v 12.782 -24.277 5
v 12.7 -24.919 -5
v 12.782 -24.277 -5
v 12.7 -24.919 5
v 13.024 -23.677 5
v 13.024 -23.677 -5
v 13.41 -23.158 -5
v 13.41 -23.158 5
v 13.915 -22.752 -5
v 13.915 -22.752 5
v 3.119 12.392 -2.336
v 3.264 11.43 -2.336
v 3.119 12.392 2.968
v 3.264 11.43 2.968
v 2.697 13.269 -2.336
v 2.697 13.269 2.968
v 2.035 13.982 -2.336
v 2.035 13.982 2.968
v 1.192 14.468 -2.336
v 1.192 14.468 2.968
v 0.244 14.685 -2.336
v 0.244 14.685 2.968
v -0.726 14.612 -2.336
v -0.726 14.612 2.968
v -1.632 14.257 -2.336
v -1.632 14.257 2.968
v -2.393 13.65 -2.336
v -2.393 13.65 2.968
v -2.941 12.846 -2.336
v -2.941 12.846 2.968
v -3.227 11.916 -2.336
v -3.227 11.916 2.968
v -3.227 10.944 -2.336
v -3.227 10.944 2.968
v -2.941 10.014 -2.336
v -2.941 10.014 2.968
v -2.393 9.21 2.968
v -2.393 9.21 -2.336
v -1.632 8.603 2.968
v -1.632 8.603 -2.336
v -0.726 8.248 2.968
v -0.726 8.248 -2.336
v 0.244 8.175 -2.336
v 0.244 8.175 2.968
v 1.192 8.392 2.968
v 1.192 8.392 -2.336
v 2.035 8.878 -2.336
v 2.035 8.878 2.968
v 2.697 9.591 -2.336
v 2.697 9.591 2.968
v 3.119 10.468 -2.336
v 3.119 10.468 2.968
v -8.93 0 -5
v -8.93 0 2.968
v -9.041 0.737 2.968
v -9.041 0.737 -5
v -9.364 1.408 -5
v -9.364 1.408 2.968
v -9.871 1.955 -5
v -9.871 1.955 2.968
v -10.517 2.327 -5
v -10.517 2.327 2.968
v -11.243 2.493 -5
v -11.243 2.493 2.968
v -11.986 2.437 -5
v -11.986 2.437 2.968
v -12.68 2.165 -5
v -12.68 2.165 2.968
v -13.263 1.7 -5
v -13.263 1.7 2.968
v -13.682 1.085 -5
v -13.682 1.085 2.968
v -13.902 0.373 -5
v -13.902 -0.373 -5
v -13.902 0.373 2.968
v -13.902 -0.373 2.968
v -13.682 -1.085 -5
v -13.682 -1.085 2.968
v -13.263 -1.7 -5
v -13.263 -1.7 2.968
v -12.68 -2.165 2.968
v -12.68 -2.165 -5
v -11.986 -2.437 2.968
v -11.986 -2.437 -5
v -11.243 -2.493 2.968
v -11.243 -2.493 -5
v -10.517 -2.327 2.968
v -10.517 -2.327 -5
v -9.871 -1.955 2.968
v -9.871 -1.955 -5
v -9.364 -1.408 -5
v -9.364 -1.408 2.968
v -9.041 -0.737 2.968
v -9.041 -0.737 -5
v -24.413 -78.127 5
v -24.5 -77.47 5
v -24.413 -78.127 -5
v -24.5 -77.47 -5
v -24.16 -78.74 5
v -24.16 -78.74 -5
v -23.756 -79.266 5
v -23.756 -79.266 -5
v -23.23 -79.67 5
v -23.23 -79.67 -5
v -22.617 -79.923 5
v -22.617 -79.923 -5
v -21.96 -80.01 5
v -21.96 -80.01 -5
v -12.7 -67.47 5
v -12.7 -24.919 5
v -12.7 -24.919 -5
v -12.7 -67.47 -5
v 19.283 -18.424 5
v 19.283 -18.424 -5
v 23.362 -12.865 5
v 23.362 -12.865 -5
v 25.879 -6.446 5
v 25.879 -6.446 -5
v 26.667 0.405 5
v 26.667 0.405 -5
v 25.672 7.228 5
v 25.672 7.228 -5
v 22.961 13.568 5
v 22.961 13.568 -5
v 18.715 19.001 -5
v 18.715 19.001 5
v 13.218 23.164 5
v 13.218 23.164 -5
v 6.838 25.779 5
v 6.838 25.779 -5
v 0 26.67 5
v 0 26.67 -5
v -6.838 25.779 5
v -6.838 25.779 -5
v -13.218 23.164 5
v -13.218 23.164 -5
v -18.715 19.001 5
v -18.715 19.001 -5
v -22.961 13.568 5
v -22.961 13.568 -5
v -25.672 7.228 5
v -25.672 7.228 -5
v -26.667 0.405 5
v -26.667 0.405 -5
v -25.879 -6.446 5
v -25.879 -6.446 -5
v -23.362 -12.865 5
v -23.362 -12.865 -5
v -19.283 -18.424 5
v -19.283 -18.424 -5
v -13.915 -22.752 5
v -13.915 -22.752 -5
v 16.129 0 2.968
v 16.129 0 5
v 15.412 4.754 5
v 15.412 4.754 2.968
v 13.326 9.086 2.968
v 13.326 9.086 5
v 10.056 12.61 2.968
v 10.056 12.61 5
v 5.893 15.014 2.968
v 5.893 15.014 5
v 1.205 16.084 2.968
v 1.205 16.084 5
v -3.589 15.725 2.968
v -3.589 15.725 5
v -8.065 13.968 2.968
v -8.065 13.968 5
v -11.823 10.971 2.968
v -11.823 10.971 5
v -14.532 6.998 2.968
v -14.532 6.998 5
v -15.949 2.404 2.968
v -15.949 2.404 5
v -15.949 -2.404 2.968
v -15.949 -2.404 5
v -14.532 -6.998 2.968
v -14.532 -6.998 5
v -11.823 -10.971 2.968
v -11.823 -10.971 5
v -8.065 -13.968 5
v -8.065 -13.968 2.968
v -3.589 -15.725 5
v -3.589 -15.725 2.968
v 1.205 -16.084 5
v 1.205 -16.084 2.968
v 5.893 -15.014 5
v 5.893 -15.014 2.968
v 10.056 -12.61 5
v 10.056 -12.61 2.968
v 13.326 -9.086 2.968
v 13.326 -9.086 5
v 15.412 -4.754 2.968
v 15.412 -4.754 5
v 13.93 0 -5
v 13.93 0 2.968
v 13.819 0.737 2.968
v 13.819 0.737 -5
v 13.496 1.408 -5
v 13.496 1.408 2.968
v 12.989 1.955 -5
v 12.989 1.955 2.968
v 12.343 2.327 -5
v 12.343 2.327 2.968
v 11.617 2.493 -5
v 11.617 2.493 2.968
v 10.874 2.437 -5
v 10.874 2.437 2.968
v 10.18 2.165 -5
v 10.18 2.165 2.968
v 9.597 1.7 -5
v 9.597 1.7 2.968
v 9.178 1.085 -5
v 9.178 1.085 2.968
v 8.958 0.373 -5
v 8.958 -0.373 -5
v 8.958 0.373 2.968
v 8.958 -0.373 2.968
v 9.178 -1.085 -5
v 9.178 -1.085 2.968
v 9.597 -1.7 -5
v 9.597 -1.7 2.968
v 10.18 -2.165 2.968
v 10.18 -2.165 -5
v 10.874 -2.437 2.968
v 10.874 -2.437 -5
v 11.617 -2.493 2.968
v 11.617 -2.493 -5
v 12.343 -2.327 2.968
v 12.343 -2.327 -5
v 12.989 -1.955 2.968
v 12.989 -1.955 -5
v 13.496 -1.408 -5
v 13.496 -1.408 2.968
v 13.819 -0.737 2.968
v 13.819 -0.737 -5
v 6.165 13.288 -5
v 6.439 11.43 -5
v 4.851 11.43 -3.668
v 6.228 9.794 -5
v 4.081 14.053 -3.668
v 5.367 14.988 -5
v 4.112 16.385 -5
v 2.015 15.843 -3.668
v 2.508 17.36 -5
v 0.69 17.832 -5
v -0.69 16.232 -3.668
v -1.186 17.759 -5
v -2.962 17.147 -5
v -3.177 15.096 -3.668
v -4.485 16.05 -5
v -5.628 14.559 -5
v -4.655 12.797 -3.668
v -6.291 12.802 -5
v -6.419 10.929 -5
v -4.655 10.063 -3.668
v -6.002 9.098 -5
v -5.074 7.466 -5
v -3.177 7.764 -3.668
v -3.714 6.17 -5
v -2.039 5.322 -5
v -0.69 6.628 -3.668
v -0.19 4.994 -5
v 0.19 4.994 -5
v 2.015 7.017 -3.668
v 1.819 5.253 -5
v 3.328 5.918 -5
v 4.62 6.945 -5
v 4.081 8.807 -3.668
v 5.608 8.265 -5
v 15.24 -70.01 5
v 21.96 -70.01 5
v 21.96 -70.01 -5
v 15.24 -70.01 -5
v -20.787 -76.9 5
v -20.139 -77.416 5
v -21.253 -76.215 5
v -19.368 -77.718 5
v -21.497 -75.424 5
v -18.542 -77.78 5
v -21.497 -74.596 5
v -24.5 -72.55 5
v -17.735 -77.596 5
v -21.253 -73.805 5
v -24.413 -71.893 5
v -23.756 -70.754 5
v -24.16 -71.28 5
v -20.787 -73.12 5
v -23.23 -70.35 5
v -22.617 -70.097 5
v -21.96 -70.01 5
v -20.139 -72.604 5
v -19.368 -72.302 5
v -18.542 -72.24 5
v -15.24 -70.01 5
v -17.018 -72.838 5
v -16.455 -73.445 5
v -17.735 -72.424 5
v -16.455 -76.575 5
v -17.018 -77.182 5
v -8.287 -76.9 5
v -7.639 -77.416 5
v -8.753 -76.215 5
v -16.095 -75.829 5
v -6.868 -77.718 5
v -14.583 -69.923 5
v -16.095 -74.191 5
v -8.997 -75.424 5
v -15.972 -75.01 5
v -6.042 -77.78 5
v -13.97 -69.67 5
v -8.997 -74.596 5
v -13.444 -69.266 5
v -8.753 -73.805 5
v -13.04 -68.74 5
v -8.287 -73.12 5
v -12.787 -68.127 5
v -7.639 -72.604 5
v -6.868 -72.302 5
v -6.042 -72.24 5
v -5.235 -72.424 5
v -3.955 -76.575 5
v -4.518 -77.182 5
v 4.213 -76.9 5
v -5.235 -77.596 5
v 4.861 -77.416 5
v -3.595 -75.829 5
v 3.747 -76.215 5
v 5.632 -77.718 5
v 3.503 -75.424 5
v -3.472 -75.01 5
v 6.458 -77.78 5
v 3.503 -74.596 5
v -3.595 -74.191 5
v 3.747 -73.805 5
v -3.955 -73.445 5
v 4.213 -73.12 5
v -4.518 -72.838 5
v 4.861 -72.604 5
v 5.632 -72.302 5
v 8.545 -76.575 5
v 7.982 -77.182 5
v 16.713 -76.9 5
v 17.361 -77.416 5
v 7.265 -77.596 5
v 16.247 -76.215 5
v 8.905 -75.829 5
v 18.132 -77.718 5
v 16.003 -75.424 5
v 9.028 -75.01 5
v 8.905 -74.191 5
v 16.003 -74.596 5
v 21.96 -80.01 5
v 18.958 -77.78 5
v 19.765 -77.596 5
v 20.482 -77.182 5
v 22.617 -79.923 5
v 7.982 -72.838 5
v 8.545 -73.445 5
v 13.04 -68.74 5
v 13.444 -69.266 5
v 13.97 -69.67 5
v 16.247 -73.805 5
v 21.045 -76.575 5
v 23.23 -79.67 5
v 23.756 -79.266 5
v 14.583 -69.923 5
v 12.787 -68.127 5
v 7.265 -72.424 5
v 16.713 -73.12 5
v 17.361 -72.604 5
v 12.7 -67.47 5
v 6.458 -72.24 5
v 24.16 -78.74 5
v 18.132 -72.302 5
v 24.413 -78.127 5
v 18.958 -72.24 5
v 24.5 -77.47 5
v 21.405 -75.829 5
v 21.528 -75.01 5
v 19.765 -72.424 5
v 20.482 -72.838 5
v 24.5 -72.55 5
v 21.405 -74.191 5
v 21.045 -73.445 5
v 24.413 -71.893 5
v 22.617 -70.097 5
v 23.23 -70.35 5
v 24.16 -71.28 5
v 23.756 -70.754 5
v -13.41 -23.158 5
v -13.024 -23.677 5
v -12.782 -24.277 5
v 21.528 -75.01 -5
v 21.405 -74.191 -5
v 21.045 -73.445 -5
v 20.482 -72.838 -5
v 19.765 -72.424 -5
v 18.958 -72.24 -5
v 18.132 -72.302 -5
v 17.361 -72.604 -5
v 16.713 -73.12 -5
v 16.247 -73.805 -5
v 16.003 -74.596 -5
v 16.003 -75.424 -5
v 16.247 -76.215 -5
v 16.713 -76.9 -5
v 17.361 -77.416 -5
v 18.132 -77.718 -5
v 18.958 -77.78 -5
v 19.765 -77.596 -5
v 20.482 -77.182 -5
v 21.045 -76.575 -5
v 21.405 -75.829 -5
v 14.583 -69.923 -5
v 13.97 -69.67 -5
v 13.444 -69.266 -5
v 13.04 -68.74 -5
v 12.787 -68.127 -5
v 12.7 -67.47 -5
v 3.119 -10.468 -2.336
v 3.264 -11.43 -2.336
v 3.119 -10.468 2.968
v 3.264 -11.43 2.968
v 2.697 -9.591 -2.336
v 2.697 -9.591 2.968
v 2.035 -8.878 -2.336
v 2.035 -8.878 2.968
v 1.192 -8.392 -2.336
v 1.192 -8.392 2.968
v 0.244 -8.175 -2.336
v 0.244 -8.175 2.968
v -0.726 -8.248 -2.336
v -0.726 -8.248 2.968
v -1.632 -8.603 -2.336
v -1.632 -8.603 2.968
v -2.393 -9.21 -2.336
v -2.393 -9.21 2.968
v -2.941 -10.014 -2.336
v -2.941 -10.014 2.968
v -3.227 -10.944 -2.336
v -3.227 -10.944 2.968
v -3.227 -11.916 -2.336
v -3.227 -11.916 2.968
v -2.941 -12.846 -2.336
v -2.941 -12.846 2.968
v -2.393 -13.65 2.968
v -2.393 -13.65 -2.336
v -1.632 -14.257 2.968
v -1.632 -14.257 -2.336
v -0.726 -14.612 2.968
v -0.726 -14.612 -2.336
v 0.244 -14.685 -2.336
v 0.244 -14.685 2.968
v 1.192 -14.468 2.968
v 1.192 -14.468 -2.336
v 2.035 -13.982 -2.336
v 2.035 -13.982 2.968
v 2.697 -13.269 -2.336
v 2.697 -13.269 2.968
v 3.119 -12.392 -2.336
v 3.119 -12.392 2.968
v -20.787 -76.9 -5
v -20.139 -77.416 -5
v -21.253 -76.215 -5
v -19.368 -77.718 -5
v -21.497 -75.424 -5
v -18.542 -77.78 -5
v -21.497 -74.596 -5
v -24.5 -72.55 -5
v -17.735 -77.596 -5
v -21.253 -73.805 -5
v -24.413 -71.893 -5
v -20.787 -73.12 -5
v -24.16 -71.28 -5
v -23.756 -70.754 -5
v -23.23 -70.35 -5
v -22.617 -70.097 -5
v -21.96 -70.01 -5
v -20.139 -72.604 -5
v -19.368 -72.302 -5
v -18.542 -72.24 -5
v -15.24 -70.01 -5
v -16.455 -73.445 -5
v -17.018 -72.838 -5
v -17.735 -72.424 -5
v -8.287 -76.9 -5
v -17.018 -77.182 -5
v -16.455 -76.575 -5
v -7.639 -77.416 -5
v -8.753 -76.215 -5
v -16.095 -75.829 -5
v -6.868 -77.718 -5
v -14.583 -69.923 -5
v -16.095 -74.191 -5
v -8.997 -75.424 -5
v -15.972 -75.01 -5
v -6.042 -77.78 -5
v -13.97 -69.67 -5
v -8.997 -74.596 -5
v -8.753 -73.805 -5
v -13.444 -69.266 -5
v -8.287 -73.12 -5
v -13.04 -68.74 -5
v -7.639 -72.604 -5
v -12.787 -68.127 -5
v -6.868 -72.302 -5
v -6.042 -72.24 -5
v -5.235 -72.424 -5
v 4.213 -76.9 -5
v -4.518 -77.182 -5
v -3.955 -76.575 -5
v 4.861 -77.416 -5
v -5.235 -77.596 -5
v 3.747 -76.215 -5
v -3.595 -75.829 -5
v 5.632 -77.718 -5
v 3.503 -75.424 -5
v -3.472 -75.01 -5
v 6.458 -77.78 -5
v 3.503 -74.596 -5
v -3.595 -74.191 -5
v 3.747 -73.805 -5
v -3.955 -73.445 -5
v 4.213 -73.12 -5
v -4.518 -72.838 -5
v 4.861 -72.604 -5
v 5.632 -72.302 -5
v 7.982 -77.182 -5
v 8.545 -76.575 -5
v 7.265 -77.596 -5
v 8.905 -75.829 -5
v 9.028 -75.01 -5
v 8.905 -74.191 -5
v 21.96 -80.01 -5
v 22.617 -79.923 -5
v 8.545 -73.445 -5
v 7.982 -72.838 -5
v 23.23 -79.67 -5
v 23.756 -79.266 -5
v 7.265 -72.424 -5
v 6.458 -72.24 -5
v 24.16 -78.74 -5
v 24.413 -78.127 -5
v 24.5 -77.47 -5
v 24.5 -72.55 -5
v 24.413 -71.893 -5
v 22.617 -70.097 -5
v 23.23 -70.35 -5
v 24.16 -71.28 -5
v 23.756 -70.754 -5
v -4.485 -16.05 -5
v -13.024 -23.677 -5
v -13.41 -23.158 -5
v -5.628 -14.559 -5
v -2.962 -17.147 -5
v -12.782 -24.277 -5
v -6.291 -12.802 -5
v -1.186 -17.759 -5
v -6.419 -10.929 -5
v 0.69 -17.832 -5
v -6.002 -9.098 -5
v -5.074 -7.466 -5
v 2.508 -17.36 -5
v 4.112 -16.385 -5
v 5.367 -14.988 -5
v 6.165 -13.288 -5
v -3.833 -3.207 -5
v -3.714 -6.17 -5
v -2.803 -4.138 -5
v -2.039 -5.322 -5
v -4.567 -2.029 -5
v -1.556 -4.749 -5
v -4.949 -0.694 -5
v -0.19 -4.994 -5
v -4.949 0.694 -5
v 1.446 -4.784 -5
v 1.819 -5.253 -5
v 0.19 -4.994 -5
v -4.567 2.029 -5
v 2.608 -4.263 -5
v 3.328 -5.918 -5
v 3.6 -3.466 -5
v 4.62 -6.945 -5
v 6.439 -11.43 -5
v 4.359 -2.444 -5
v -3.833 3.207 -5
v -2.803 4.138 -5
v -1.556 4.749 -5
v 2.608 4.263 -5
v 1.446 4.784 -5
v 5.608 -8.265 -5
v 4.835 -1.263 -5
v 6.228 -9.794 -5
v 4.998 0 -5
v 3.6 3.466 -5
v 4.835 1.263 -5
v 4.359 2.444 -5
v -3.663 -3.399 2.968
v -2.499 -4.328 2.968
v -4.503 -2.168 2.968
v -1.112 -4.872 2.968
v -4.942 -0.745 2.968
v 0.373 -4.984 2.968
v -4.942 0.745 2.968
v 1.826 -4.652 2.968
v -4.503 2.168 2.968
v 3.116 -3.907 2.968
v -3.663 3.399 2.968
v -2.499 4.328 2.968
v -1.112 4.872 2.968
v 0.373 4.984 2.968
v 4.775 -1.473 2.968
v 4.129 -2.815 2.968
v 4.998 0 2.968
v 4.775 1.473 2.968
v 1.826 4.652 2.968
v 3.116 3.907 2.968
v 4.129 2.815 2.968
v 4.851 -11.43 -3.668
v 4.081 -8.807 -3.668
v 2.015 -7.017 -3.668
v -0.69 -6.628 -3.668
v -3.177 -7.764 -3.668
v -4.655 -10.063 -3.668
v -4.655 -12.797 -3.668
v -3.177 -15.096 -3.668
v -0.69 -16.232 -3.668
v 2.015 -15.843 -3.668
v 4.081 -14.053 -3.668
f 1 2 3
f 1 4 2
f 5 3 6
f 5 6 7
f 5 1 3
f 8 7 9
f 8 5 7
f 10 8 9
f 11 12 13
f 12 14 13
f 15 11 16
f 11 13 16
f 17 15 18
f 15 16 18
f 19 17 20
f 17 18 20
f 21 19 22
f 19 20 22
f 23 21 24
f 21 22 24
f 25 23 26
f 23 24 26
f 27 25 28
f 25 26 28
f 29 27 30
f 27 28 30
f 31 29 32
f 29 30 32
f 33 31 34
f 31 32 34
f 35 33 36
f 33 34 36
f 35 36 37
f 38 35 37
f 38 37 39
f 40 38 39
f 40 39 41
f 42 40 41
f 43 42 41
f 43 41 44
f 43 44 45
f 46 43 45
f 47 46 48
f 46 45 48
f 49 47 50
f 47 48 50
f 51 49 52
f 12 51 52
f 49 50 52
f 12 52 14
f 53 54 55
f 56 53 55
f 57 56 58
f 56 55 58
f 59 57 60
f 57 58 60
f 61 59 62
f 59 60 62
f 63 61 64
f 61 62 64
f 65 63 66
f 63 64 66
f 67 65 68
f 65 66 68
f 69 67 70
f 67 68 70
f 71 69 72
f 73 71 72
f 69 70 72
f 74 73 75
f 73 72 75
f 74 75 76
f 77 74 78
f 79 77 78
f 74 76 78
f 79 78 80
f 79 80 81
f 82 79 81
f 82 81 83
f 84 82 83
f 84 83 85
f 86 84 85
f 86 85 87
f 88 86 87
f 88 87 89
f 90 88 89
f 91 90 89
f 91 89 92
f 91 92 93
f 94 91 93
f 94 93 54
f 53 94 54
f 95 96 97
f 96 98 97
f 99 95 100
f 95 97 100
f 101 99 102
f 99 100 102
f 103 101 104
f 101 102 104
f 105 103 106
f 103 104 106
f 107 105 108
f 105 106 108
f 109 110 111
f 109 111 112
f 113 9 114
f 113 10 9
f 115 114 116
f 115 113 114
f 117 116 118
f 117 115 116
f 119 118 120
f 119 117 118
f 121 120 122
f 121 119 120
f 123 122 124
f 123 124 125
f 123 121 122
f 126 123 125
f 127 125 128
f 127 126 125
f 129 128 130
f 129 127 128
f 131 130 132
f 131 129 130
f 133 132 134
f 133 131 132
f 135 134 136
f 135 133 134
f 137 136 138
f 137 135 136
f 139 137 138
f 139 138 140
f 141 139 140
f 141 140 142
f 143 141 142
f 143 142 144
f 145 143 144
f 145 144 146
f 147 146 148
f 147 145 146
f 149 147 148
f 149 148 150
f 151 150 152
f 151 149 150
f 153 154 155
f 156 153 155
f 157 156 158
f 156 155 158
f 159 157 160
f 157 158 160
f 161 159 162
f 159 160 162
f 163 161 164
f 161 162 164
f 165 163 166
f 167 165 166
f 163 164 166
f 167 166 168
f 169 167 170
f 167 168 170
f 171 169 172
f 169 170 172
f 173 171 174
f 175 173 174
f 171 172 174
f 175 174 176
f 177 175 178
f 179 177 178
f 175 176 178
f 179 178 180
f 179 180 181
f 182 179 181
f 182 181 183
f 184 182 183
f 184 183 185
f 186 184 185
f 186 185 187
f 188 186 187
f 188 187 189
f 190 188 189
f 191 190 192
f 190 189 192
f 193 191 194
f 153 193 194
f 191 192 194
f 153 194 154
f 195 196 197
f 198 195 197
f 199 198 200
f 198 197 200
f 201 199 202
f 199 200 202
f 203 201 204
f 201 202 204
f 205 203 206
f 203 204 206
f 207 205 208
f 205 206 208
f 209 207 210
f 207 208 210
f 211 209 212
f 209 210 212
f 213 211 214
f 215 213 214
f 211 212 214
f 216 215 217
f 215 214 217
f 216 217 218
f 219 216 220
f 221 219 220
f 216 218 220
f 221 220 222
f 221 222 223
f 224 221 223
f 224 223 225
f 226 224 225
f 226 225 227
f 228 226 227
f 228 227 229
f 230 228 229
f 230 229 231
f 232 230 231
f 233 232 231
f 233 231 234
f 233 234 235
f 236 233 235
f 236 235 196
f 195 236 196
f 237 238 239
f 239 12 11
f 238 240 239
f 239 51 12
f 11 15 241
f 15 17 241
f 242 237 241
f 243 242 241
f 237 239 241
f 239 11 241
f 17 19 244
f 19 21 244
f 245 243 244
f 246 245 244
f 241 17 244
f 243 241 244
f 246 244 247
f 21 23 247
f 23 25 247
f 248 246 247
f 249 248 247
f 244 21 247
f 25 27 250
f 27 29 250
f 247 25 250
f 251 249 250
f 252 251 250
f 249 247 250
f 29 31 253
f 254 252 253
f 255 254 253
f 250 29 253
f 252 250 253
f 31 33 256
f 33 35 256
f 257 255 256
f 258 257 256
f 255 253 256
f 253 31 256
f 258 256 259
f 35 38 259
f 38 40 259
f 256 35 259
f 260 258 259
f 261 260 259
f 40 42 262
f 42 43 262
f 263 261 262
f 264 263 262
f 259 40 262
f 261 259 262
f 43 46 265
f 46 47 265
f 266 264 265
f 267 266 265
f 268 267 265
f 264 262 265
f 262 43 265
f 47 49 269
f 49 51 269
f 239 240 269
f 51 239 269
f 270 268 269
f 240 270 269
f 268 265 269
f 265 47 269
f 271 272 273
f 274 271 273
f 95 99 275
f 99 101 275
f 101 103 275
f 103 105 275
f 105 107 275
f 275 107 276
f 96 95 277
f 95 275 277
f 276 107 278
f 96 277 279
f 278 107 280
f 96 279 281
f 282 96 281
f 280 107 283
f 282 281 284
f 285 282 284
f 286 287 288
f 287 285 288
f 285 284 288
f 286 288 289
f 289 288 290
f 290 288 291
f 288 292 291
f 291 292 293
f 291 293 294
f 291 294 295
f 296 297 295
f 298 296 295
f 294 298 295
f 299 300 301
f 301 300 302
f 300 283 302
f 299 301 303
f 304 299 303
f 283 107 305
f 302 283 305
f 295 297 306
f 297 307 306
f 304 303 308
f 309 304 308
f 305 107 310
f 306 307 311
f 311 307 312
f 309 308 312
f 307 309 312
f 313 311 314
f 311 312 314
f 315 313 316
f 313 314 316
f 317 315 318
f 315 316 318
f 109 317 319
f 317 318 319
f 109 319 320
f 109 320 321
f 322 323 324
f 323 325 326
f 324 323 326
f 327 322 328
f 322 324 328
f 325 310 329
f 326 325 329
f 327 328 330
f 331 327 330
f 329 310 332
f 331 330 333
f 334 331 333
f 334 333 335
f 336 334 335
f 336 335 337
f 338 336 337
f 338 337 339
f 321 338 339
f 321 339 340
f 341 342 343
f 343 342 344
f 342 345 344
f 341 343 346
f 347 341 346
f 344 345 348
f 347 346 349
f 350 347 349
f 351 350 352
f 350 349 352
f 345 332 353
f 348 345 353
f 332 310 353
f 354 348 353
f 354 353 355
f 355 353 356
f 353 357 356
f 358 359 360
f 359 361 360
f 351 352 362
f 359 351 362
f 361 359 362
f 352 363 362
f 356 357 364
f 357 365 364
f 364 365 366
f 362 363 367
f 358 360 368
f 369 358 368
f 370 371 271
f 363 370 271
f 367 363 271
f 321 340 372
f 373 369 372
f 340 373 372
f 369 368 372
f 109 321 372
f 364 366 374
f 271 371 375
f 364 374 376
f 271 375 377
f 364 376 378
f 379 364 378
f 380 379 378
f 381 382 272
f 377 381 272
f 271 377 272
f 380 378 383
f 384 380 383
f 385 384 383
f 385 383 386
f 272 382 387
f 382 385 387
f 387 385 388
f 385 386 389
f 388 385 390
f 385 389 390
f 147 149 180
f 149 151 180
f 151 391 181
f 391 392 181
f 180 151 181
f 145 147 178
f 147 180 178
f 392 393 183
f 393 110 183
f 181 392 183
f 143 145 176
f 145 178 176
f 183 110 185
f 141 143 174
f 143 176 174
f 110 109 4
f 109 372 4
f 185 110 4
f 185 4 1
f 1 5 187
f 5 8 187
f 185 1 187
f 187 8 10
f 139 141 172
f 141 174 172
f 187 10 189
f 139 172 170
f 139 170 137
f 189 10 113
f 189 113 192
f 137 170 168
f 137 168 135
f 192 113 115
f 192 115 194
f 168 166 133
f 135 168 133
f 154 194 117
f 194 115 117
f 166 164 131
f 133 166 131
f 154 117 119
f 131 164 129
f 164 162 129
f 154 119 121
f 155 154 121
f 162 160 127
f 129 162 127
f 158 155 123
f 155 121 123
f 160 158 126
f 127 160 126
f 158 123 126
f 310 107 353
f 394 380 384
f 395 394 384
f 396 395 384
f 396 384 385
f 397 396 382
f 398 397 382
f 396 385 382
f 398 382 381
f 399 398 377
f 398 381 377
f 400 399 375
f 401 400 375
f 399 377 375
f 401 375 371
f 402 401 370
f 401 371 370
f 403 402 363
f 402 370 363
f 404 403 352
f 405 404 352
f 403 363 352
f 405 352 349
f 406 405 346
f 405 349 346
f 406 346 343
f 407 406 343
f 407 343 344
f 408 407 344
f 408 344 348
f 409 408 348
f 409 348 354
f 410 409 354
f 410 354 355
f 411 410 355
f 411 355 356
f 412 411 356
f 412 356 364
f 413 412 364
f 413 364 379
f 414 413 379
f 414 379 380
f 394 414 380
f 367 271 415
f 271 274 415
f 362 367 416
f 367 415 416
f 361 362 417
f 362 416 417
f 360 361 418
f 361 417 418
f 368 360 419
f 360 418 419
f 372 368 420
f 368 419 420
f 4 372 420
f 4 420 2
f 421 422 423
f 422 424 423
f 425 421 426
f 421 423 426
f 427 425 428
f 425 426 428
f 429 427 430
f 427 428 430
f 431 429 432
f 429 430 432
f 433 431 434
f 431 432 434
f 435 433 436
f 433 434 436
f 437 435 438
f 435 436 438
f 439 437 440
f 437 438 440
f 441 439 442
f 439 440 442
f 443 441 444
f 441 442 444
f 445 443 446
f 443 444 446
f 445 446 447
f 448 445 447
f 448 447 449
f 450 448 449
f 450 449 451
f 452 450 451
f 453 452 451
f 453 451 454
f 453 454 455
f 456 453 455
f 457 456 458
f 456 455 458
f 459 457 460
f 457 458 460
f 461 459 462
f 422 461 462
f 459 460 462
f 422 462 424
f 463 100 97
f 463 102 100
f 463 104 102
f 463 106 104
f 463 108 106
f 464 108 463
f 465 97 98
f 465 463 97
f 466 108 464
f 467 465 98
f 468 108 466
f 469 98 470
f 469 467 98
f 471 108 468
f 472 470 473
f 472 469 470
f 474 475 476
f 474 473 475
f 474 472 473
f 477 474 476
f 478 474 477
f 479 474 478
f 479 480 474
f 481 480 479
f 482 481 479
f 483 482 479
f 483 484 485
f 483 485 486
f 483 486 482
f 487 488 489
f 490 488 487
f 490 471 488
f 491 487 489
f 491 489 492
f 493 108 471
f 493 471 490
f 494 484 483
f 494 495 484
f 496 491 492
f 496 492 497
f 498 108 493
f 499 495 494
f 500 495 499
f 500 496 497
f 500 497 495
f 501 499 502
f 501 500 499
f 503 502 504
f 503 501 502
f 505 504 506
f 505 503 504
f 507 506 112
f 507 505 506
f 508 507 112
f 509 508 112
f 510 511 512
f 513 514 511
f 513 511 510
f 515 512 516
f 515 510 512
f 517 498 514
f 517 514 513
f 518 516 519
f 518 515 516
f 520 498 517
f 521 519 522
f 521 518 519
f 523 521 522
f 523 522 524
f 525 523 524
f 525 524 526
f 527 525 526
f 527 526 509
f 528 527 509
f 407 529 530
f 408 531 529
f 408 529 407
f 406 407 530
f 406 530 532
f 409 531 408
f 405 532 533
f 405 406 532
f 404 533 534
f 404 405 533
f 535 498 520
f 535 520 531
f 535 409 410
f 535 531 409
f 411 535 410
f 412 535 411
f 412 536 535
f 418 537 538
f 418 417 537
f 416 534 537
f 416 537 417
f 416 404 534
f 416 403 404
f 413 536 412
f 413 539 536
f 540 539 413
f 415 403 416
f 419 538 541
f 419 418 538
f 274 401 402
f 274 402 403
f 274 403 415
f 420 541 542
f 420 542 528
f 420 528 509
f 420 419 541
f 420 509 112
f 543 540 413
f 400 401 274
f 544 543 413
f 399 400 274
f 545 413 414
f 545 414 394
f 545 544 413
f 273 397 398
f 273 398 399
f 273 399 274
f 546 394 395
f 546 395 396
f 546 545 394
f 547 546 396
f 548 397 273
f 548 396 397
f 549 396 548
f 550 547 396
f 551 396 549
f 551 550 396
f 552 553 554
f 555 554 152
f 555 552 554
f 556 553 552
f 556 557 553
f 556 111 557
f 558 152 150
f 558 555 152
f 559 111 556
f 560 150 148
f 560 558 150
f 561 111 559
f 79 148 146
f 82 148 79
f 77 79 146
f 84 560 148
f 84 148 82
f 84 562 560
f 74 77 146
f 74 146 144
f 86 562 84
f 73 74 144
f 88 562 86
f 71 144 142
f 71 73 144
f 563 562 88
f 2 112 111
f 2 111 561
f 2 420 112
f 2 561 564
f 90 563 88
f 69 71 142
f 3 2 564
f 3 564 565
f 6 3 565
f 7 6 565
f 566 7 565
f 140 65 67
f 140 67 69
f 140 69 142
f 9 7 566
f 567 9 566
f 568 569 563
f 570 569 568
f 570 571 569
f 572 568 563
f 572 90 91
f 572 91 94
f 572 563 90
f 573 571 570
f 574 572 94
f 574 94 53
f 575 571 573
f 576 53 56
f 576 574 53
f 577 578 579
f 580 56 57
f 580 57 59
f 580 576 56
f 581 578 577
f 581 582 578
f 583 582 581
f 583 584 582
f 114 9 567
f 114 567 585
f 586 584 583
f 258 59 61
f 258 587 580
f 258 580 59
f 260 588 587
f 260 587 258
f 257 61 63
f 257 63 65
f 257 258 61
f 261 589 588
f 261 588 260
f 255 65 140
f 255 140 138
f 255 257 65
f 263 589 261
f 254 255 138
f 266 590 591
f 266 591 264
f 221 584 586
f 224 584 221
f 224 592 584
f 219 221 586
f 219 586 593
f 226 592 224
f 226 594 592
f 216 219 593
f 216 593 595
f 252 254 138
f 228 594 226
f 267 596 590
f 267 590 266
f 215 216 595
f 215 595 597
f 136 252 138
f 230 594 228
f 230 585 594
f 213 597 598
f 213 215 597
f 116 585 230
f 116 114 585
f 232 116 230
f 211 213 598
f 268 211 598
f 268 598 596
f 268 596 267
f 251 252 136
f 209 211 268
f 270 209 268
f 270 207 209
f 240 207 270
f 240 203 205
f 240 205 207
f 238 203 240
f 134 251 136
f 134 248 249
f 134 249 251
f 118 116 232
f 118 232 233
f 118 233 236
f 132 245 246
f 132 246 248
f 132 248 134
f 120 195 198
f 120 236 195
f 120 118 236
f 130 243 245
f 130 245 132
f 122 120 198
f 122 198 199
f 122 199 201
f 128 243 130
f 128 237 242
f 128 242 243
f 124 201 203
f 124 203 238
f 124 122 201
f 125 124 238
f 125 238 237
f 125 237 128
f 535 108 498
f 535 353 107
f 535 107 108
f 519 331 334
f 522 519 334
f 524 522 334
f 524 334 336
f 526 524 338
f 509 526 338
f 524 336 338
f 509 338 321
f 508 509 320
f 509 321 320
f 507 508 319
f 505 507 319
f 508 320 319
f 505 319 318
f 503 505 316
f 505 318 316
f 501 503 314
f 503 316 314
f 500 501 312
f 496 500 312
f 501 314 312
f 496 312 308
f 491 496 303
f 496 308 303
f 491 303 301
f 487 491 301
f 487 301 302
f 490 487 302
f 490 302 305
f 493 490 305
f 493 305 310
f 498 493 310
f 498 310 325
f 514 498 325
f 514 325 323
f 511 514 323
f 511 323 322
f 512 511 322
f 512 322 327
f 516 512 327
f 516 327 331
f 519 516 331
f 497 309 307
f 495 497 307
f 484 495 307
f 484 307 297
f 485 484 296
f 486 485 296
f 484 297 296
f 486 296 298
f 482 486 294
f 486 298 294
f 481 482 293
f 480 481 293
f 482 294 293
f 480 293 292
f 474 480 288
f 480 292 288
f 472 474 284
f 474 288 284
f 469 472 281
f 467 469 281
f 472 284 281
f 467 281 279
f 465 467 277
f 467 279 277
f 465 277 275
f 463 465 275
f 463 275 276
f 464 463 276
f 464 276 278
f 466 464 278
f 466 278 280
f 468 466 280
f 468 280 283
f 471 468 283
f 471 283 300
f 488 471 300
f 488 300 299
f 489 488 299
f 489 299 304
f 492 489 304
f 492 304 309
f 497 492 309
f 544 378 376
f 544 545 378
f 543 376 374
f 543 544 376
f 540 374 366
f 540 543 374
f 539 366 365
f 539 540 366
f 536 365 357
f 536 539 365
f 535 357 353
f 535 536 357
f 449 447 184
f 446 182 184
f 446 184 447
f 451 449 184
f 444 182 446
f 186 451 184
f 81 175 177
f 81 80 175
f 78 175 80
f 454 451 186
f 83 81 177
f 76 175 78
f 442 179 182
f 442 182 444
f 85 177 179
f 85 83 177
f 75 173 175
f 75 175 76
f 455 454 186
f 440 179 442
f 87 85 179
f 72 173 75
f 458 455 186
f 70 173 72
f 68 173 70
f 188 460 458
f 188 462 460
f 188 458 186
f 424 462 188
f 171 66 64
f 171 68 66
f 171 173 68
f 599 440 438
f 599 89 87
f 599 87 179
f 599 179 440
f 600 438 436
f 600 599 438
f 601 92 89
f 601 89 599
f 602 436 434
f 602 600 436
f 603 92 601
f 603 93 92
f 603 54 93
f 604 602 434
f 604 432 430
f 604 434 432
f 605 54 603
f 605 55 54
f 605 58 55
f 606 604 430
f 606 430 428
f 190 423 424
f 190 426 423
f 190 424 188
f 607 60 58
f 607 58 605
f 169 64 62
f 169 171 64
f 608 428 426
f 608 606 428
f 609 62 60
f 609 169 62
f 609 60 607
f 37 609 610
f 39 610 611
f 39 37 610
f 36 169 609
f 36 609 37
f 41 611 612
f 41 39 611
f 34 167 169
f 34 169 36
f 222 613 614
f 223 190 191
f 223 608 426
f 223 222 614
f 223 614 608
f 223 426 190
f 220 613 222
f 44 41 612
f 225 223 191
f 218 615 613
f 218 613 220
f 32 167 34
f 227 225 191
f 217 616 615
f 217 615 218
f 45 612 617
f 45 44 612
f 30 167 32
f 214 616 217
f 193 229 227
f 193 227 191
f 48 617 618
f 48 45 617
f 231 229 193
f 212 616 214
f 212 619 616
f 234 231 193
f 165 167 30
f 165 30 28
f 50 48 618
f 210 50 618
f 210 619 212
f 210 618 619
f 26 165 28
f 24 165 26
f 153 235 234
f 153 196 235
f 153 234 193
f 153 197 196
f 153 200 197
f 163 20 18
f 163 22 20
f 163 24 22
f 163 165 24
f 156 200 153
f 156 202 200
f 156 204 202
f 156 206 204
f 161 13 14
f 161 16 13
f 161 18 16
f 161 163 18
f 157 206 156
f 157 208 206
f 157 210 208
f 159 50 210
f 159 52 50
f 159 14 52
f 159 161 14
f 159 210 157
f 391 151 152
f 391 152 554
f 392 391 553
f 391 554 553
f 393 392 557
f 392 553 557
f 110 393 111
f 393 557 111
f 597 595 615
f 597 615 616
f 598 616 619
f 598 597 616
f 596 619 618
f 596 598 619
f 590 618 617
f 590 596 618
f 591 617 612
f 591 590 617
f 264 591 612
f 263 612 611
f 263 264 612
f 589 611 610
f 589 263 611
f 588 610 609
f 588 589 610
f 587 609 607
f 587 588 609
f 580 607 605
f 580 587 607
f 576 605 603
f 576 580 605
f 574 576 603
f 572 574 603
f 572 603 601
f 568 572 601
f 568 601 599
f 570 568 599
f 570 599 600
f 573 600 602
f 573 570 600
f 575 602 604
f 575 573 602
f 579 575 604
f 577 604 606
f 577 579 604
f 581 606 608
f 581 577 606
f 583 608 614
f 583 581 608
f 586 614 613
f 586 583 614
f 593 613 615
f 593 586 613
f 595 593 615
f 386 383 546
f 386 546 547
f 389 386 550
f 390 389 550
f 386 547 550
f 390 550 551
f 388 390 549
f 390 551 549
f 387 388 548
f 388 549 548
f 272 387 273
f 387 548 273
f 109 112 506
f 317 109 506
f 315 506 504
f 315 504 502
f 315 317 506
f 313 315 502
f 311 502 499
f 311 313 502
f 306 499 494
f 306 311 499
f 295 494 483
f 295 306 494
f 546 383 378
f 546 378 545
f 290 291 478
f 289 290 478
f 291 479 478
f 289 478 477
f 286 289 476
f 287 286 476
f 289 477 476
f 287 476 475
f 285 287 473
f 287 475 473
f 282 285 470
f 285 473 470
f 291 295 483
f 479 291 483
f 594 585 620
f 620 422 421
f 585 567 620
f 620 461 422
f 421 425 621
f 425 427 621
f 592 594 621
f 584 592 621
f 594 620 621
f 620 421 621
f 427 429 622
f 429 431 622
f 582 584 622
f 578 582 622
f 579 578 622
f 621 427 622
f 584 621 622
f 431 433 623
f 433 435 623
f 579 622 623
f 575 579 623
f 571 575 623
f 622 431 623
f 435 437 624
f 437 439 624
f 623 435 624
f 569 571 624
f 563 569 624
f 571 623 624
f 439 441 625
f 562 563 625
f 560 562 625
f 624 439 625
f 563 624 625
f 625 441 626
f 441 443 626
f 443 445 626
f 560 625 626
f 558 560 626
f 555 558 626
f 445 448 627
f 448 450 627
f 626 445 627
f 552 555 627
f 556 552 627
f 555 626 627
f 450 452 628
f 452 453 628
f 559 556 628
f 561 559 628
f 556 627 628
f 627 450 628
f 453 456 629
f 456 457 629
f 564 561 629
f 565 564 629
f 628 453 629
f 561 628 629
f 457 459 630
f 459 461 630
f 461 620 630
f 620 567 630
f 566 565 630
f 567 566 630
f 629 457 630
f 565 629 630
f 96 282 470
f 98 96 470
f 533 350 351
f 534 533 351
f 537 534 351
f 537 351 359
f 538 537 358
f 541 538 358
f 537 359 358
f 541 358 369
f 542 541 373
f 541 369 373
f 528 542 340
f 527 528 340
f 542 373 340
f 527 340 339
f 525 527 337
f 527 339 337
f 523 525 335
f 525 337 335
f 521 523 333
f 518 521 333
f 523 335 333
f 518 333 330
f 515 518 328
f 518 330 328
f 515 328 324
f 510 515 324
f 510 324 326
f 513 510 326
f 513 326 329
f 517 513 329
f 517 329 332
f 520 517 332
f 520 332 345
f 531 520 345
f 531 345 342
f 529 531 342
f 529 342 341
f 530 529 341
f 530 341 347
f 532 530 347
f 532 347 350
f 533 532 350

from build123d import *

# Parameters (mm, degrees)
SKETCH1_R                                           = 4.9975
BOSS_EXTRUDE1_DEPTH                                 = 4.999999995
SKETCH5_R                                           = 16.129
CUT_EXTRUDE2_DEPTH                                  = 2.032
F_5_0MM_DOWEL_HOLE1_D                               = 5
F_5_0MM_DOWEL_HOLE1_DEPTH                           = 16.51
F_5_0MM_DOWEL_HOLE1_TIP                             = 1.502151548
CSK_FOR_1_4_FLAT_HEAD_MACHINE_SCREW_100_D           = 6.5278
CSK_FOR_1_4_FLAT_HEAD_MACHINE_SCREW_100_DEPTH       = 16.51
CSK_FOR_1_4_FLAT_HEAD_MACHINE_SCREW_100_CSINK_D     = 12.8778
CSK_FOR_1_4_FLAT_HEAD_MACHINE_SCREW_100_CSINK_ANGLE = 100
CSK_FOR_1_4_FLAT_HEAD_MACHINE_SCREW_100_TIP         = 1.961148974
SKETCH26_W                                          = 9.99999999
SKETCH26_H                                          = 10.000000066
BOSS_EXTRUDE2_DEPTH                                 = 24.500000022
FILLET1_R                                           = 2.54
F_7_32_0_21875_DIAMETER_HOLE1_D                     = 5.55625
F_7_32_0_21875_DIAMETER_HOLE1_DEPTH                 = 16.51
F_7_32_0_21875_DIAMETER_HOLE1_TIP                   = 1.669265907


with BuildPart() as part:
    # Sketch1 → Boss-Extrude1 (new, symmetric)
    with BuildSketch(Plane.XY):
        with BuildLine():
            Line((-12.7, -80.01), (12.7, -80.01))
            Line((12.7, -80.01), (12.7, -23.452055347))
            ThreePointArc((12.7, -23.452055347), (0, 26.67), (-12.7, -23.452055347))
            Line((-12.7, -23.452055347), (-12.7, -80.01))
        make_face()
        Circle(SKETCH1_R, mode=Mode.SUBTRACT)
    extrude(amount=BOSS_EXTRUDE1_DEPTH, both=True)

    # Sketch5 → Cut-Extrude2 (cut)
    with BuildSketch(Plane.XY.offset(4.999999995)):
        Circle(SKETCH5_R)
    extrude(amount=-CUT_EXTRUDE2_DEPTH, mode=Mode.SUBTRACT)

    # Ø5.0mm Dowel Hole1
    with Locations(Plane(origin=(11.43, 0, -4.999999995), x_dir=(-1, 0, 0), z_dir=(0, 0, -1))):
        with Locations((0, 0), (22.86, 0)):
            Hole(F_5_0MM_DOWEL_HOLE1_D / 2, depth=F_5_0MM_DOWEL_HOLE1_DEPTH)
            with Locations((0, 0, -(F_5_0MM_DOWEL_HOLE1_DEPTH + F_5_0MM_DOWEL_HOLE1_TIP / 2))):  # 118° drill point
                Cone(0, F_5_0MM_DOWEL_HOLE1_D / 2, F_5_0MM_DOWEL_HOLE1_TIP, mode=Mode.SUBTRACT)

    # CSK for 1/4 Flat Head Machine Screw (100)1
    with Locations(Plane(origin=(0, 11.43, -4.999999995), x_dir=(-1, 0, 0), z_dir=(0, 0, -1))):
        with Locations((0, 0), (0, -22.86)):
            CounterSinkHole(CSK_FOR_1_4_FLAT_HEAD_MACHINE_SCREW_100_D / 2, CSK_FOR_1_4_FLAT_HEAD_MACHINE_SCREW_100_CSINK_D / 2, depth=CSK_FOR_1_4_FLAT_HEAD_MACHINE_SCREW_100_DEPTH, counter_sink_angle=CSK_FOR_1_4_FLAT_HEAD_MACHINE_SCREW_100_CSINK_ANGLE)
            with Locations((0, 0, -(CSK_FOR_1_4_FLAT_HEAD_MACHINE_SCREW_100_DEPTH + CSK_FOR_1_4_FLAT_HEAD_MACHINE_SCREW_100_TIP / 2))):  # 118° drill point
                Cone(0, CSK_FOR_1_4_FLAT_HEAD_MACHINE_SCREW_100_D / 2, CSK_FOR_1_4_FLAT_HEAD_MACHINE_SCREW_100_TIP, mode=Mode.SUBTRACT)

    # Sketch26 → Boss-Extrude2 (add, symmetric)
    with BuildSketch(Plane(origin=(0, 0, 0), x_dir=(0, 0, -1), z_dir=(1, 0, 0))):
        with Locations((0, -75.009999967)):
            Rectangle(SKETCH26_W, SKETCH26_H)
    extrude(amount=BOSS_EXTRUDE2_DEPTH, both=True)

    # Fillet1
    fillet1_edges = [part.edges().sort_by_distance(p)[0] for p in [
        (12.7, -23.452055347, 0),
        (12.7, -70.009999934, 0),
        (-12.7, -23.452055347, 0),
        (-12.7, -70.009999934, 0),
        (-24.500000022, -70.009999934, 0),
        (-24.500000022, -80.01, 0),
        (24.500000022, -70.009999934, 0),
        (24.500000022, -80.01, 0),
    ]]
    fillet(fillet1_edges, radius=FILLET1_R)

    # 7/32 (0.21875) Diameter Hole1
    with Locations(Plane(origin=(-18.749999584, -75.009999967, -4.999999995), x_dir=(-1, 0, 0), z_dir=(0, 0, -1))):
        with Locations((0, 0), (-12.499999892, 0), (-24.999999784, 0), (-37.499999676, 0)):
            Hole(F_7_32_0_21875_DIAMETER_HOLE1_D / 2, depth=F_7_32_0_21875_DIAMETER_HOLE1_DEPTH)
            with Locations((0, 0, -(F_7_32_0_21875_DIAMETER_HOLE1_DEPTH + F_7_32_0_21875_DIAMETER_HOLE1_TIP / 2))):  # 118° drill point
                Cone(0, F_7_32_0_21875_DIAMETER_HOLE1_D / 2, F_7_32_0_21875_DIAMETER_HOLE1_TIP, mode=Mode.SUBTRACT)


solid = part.part
